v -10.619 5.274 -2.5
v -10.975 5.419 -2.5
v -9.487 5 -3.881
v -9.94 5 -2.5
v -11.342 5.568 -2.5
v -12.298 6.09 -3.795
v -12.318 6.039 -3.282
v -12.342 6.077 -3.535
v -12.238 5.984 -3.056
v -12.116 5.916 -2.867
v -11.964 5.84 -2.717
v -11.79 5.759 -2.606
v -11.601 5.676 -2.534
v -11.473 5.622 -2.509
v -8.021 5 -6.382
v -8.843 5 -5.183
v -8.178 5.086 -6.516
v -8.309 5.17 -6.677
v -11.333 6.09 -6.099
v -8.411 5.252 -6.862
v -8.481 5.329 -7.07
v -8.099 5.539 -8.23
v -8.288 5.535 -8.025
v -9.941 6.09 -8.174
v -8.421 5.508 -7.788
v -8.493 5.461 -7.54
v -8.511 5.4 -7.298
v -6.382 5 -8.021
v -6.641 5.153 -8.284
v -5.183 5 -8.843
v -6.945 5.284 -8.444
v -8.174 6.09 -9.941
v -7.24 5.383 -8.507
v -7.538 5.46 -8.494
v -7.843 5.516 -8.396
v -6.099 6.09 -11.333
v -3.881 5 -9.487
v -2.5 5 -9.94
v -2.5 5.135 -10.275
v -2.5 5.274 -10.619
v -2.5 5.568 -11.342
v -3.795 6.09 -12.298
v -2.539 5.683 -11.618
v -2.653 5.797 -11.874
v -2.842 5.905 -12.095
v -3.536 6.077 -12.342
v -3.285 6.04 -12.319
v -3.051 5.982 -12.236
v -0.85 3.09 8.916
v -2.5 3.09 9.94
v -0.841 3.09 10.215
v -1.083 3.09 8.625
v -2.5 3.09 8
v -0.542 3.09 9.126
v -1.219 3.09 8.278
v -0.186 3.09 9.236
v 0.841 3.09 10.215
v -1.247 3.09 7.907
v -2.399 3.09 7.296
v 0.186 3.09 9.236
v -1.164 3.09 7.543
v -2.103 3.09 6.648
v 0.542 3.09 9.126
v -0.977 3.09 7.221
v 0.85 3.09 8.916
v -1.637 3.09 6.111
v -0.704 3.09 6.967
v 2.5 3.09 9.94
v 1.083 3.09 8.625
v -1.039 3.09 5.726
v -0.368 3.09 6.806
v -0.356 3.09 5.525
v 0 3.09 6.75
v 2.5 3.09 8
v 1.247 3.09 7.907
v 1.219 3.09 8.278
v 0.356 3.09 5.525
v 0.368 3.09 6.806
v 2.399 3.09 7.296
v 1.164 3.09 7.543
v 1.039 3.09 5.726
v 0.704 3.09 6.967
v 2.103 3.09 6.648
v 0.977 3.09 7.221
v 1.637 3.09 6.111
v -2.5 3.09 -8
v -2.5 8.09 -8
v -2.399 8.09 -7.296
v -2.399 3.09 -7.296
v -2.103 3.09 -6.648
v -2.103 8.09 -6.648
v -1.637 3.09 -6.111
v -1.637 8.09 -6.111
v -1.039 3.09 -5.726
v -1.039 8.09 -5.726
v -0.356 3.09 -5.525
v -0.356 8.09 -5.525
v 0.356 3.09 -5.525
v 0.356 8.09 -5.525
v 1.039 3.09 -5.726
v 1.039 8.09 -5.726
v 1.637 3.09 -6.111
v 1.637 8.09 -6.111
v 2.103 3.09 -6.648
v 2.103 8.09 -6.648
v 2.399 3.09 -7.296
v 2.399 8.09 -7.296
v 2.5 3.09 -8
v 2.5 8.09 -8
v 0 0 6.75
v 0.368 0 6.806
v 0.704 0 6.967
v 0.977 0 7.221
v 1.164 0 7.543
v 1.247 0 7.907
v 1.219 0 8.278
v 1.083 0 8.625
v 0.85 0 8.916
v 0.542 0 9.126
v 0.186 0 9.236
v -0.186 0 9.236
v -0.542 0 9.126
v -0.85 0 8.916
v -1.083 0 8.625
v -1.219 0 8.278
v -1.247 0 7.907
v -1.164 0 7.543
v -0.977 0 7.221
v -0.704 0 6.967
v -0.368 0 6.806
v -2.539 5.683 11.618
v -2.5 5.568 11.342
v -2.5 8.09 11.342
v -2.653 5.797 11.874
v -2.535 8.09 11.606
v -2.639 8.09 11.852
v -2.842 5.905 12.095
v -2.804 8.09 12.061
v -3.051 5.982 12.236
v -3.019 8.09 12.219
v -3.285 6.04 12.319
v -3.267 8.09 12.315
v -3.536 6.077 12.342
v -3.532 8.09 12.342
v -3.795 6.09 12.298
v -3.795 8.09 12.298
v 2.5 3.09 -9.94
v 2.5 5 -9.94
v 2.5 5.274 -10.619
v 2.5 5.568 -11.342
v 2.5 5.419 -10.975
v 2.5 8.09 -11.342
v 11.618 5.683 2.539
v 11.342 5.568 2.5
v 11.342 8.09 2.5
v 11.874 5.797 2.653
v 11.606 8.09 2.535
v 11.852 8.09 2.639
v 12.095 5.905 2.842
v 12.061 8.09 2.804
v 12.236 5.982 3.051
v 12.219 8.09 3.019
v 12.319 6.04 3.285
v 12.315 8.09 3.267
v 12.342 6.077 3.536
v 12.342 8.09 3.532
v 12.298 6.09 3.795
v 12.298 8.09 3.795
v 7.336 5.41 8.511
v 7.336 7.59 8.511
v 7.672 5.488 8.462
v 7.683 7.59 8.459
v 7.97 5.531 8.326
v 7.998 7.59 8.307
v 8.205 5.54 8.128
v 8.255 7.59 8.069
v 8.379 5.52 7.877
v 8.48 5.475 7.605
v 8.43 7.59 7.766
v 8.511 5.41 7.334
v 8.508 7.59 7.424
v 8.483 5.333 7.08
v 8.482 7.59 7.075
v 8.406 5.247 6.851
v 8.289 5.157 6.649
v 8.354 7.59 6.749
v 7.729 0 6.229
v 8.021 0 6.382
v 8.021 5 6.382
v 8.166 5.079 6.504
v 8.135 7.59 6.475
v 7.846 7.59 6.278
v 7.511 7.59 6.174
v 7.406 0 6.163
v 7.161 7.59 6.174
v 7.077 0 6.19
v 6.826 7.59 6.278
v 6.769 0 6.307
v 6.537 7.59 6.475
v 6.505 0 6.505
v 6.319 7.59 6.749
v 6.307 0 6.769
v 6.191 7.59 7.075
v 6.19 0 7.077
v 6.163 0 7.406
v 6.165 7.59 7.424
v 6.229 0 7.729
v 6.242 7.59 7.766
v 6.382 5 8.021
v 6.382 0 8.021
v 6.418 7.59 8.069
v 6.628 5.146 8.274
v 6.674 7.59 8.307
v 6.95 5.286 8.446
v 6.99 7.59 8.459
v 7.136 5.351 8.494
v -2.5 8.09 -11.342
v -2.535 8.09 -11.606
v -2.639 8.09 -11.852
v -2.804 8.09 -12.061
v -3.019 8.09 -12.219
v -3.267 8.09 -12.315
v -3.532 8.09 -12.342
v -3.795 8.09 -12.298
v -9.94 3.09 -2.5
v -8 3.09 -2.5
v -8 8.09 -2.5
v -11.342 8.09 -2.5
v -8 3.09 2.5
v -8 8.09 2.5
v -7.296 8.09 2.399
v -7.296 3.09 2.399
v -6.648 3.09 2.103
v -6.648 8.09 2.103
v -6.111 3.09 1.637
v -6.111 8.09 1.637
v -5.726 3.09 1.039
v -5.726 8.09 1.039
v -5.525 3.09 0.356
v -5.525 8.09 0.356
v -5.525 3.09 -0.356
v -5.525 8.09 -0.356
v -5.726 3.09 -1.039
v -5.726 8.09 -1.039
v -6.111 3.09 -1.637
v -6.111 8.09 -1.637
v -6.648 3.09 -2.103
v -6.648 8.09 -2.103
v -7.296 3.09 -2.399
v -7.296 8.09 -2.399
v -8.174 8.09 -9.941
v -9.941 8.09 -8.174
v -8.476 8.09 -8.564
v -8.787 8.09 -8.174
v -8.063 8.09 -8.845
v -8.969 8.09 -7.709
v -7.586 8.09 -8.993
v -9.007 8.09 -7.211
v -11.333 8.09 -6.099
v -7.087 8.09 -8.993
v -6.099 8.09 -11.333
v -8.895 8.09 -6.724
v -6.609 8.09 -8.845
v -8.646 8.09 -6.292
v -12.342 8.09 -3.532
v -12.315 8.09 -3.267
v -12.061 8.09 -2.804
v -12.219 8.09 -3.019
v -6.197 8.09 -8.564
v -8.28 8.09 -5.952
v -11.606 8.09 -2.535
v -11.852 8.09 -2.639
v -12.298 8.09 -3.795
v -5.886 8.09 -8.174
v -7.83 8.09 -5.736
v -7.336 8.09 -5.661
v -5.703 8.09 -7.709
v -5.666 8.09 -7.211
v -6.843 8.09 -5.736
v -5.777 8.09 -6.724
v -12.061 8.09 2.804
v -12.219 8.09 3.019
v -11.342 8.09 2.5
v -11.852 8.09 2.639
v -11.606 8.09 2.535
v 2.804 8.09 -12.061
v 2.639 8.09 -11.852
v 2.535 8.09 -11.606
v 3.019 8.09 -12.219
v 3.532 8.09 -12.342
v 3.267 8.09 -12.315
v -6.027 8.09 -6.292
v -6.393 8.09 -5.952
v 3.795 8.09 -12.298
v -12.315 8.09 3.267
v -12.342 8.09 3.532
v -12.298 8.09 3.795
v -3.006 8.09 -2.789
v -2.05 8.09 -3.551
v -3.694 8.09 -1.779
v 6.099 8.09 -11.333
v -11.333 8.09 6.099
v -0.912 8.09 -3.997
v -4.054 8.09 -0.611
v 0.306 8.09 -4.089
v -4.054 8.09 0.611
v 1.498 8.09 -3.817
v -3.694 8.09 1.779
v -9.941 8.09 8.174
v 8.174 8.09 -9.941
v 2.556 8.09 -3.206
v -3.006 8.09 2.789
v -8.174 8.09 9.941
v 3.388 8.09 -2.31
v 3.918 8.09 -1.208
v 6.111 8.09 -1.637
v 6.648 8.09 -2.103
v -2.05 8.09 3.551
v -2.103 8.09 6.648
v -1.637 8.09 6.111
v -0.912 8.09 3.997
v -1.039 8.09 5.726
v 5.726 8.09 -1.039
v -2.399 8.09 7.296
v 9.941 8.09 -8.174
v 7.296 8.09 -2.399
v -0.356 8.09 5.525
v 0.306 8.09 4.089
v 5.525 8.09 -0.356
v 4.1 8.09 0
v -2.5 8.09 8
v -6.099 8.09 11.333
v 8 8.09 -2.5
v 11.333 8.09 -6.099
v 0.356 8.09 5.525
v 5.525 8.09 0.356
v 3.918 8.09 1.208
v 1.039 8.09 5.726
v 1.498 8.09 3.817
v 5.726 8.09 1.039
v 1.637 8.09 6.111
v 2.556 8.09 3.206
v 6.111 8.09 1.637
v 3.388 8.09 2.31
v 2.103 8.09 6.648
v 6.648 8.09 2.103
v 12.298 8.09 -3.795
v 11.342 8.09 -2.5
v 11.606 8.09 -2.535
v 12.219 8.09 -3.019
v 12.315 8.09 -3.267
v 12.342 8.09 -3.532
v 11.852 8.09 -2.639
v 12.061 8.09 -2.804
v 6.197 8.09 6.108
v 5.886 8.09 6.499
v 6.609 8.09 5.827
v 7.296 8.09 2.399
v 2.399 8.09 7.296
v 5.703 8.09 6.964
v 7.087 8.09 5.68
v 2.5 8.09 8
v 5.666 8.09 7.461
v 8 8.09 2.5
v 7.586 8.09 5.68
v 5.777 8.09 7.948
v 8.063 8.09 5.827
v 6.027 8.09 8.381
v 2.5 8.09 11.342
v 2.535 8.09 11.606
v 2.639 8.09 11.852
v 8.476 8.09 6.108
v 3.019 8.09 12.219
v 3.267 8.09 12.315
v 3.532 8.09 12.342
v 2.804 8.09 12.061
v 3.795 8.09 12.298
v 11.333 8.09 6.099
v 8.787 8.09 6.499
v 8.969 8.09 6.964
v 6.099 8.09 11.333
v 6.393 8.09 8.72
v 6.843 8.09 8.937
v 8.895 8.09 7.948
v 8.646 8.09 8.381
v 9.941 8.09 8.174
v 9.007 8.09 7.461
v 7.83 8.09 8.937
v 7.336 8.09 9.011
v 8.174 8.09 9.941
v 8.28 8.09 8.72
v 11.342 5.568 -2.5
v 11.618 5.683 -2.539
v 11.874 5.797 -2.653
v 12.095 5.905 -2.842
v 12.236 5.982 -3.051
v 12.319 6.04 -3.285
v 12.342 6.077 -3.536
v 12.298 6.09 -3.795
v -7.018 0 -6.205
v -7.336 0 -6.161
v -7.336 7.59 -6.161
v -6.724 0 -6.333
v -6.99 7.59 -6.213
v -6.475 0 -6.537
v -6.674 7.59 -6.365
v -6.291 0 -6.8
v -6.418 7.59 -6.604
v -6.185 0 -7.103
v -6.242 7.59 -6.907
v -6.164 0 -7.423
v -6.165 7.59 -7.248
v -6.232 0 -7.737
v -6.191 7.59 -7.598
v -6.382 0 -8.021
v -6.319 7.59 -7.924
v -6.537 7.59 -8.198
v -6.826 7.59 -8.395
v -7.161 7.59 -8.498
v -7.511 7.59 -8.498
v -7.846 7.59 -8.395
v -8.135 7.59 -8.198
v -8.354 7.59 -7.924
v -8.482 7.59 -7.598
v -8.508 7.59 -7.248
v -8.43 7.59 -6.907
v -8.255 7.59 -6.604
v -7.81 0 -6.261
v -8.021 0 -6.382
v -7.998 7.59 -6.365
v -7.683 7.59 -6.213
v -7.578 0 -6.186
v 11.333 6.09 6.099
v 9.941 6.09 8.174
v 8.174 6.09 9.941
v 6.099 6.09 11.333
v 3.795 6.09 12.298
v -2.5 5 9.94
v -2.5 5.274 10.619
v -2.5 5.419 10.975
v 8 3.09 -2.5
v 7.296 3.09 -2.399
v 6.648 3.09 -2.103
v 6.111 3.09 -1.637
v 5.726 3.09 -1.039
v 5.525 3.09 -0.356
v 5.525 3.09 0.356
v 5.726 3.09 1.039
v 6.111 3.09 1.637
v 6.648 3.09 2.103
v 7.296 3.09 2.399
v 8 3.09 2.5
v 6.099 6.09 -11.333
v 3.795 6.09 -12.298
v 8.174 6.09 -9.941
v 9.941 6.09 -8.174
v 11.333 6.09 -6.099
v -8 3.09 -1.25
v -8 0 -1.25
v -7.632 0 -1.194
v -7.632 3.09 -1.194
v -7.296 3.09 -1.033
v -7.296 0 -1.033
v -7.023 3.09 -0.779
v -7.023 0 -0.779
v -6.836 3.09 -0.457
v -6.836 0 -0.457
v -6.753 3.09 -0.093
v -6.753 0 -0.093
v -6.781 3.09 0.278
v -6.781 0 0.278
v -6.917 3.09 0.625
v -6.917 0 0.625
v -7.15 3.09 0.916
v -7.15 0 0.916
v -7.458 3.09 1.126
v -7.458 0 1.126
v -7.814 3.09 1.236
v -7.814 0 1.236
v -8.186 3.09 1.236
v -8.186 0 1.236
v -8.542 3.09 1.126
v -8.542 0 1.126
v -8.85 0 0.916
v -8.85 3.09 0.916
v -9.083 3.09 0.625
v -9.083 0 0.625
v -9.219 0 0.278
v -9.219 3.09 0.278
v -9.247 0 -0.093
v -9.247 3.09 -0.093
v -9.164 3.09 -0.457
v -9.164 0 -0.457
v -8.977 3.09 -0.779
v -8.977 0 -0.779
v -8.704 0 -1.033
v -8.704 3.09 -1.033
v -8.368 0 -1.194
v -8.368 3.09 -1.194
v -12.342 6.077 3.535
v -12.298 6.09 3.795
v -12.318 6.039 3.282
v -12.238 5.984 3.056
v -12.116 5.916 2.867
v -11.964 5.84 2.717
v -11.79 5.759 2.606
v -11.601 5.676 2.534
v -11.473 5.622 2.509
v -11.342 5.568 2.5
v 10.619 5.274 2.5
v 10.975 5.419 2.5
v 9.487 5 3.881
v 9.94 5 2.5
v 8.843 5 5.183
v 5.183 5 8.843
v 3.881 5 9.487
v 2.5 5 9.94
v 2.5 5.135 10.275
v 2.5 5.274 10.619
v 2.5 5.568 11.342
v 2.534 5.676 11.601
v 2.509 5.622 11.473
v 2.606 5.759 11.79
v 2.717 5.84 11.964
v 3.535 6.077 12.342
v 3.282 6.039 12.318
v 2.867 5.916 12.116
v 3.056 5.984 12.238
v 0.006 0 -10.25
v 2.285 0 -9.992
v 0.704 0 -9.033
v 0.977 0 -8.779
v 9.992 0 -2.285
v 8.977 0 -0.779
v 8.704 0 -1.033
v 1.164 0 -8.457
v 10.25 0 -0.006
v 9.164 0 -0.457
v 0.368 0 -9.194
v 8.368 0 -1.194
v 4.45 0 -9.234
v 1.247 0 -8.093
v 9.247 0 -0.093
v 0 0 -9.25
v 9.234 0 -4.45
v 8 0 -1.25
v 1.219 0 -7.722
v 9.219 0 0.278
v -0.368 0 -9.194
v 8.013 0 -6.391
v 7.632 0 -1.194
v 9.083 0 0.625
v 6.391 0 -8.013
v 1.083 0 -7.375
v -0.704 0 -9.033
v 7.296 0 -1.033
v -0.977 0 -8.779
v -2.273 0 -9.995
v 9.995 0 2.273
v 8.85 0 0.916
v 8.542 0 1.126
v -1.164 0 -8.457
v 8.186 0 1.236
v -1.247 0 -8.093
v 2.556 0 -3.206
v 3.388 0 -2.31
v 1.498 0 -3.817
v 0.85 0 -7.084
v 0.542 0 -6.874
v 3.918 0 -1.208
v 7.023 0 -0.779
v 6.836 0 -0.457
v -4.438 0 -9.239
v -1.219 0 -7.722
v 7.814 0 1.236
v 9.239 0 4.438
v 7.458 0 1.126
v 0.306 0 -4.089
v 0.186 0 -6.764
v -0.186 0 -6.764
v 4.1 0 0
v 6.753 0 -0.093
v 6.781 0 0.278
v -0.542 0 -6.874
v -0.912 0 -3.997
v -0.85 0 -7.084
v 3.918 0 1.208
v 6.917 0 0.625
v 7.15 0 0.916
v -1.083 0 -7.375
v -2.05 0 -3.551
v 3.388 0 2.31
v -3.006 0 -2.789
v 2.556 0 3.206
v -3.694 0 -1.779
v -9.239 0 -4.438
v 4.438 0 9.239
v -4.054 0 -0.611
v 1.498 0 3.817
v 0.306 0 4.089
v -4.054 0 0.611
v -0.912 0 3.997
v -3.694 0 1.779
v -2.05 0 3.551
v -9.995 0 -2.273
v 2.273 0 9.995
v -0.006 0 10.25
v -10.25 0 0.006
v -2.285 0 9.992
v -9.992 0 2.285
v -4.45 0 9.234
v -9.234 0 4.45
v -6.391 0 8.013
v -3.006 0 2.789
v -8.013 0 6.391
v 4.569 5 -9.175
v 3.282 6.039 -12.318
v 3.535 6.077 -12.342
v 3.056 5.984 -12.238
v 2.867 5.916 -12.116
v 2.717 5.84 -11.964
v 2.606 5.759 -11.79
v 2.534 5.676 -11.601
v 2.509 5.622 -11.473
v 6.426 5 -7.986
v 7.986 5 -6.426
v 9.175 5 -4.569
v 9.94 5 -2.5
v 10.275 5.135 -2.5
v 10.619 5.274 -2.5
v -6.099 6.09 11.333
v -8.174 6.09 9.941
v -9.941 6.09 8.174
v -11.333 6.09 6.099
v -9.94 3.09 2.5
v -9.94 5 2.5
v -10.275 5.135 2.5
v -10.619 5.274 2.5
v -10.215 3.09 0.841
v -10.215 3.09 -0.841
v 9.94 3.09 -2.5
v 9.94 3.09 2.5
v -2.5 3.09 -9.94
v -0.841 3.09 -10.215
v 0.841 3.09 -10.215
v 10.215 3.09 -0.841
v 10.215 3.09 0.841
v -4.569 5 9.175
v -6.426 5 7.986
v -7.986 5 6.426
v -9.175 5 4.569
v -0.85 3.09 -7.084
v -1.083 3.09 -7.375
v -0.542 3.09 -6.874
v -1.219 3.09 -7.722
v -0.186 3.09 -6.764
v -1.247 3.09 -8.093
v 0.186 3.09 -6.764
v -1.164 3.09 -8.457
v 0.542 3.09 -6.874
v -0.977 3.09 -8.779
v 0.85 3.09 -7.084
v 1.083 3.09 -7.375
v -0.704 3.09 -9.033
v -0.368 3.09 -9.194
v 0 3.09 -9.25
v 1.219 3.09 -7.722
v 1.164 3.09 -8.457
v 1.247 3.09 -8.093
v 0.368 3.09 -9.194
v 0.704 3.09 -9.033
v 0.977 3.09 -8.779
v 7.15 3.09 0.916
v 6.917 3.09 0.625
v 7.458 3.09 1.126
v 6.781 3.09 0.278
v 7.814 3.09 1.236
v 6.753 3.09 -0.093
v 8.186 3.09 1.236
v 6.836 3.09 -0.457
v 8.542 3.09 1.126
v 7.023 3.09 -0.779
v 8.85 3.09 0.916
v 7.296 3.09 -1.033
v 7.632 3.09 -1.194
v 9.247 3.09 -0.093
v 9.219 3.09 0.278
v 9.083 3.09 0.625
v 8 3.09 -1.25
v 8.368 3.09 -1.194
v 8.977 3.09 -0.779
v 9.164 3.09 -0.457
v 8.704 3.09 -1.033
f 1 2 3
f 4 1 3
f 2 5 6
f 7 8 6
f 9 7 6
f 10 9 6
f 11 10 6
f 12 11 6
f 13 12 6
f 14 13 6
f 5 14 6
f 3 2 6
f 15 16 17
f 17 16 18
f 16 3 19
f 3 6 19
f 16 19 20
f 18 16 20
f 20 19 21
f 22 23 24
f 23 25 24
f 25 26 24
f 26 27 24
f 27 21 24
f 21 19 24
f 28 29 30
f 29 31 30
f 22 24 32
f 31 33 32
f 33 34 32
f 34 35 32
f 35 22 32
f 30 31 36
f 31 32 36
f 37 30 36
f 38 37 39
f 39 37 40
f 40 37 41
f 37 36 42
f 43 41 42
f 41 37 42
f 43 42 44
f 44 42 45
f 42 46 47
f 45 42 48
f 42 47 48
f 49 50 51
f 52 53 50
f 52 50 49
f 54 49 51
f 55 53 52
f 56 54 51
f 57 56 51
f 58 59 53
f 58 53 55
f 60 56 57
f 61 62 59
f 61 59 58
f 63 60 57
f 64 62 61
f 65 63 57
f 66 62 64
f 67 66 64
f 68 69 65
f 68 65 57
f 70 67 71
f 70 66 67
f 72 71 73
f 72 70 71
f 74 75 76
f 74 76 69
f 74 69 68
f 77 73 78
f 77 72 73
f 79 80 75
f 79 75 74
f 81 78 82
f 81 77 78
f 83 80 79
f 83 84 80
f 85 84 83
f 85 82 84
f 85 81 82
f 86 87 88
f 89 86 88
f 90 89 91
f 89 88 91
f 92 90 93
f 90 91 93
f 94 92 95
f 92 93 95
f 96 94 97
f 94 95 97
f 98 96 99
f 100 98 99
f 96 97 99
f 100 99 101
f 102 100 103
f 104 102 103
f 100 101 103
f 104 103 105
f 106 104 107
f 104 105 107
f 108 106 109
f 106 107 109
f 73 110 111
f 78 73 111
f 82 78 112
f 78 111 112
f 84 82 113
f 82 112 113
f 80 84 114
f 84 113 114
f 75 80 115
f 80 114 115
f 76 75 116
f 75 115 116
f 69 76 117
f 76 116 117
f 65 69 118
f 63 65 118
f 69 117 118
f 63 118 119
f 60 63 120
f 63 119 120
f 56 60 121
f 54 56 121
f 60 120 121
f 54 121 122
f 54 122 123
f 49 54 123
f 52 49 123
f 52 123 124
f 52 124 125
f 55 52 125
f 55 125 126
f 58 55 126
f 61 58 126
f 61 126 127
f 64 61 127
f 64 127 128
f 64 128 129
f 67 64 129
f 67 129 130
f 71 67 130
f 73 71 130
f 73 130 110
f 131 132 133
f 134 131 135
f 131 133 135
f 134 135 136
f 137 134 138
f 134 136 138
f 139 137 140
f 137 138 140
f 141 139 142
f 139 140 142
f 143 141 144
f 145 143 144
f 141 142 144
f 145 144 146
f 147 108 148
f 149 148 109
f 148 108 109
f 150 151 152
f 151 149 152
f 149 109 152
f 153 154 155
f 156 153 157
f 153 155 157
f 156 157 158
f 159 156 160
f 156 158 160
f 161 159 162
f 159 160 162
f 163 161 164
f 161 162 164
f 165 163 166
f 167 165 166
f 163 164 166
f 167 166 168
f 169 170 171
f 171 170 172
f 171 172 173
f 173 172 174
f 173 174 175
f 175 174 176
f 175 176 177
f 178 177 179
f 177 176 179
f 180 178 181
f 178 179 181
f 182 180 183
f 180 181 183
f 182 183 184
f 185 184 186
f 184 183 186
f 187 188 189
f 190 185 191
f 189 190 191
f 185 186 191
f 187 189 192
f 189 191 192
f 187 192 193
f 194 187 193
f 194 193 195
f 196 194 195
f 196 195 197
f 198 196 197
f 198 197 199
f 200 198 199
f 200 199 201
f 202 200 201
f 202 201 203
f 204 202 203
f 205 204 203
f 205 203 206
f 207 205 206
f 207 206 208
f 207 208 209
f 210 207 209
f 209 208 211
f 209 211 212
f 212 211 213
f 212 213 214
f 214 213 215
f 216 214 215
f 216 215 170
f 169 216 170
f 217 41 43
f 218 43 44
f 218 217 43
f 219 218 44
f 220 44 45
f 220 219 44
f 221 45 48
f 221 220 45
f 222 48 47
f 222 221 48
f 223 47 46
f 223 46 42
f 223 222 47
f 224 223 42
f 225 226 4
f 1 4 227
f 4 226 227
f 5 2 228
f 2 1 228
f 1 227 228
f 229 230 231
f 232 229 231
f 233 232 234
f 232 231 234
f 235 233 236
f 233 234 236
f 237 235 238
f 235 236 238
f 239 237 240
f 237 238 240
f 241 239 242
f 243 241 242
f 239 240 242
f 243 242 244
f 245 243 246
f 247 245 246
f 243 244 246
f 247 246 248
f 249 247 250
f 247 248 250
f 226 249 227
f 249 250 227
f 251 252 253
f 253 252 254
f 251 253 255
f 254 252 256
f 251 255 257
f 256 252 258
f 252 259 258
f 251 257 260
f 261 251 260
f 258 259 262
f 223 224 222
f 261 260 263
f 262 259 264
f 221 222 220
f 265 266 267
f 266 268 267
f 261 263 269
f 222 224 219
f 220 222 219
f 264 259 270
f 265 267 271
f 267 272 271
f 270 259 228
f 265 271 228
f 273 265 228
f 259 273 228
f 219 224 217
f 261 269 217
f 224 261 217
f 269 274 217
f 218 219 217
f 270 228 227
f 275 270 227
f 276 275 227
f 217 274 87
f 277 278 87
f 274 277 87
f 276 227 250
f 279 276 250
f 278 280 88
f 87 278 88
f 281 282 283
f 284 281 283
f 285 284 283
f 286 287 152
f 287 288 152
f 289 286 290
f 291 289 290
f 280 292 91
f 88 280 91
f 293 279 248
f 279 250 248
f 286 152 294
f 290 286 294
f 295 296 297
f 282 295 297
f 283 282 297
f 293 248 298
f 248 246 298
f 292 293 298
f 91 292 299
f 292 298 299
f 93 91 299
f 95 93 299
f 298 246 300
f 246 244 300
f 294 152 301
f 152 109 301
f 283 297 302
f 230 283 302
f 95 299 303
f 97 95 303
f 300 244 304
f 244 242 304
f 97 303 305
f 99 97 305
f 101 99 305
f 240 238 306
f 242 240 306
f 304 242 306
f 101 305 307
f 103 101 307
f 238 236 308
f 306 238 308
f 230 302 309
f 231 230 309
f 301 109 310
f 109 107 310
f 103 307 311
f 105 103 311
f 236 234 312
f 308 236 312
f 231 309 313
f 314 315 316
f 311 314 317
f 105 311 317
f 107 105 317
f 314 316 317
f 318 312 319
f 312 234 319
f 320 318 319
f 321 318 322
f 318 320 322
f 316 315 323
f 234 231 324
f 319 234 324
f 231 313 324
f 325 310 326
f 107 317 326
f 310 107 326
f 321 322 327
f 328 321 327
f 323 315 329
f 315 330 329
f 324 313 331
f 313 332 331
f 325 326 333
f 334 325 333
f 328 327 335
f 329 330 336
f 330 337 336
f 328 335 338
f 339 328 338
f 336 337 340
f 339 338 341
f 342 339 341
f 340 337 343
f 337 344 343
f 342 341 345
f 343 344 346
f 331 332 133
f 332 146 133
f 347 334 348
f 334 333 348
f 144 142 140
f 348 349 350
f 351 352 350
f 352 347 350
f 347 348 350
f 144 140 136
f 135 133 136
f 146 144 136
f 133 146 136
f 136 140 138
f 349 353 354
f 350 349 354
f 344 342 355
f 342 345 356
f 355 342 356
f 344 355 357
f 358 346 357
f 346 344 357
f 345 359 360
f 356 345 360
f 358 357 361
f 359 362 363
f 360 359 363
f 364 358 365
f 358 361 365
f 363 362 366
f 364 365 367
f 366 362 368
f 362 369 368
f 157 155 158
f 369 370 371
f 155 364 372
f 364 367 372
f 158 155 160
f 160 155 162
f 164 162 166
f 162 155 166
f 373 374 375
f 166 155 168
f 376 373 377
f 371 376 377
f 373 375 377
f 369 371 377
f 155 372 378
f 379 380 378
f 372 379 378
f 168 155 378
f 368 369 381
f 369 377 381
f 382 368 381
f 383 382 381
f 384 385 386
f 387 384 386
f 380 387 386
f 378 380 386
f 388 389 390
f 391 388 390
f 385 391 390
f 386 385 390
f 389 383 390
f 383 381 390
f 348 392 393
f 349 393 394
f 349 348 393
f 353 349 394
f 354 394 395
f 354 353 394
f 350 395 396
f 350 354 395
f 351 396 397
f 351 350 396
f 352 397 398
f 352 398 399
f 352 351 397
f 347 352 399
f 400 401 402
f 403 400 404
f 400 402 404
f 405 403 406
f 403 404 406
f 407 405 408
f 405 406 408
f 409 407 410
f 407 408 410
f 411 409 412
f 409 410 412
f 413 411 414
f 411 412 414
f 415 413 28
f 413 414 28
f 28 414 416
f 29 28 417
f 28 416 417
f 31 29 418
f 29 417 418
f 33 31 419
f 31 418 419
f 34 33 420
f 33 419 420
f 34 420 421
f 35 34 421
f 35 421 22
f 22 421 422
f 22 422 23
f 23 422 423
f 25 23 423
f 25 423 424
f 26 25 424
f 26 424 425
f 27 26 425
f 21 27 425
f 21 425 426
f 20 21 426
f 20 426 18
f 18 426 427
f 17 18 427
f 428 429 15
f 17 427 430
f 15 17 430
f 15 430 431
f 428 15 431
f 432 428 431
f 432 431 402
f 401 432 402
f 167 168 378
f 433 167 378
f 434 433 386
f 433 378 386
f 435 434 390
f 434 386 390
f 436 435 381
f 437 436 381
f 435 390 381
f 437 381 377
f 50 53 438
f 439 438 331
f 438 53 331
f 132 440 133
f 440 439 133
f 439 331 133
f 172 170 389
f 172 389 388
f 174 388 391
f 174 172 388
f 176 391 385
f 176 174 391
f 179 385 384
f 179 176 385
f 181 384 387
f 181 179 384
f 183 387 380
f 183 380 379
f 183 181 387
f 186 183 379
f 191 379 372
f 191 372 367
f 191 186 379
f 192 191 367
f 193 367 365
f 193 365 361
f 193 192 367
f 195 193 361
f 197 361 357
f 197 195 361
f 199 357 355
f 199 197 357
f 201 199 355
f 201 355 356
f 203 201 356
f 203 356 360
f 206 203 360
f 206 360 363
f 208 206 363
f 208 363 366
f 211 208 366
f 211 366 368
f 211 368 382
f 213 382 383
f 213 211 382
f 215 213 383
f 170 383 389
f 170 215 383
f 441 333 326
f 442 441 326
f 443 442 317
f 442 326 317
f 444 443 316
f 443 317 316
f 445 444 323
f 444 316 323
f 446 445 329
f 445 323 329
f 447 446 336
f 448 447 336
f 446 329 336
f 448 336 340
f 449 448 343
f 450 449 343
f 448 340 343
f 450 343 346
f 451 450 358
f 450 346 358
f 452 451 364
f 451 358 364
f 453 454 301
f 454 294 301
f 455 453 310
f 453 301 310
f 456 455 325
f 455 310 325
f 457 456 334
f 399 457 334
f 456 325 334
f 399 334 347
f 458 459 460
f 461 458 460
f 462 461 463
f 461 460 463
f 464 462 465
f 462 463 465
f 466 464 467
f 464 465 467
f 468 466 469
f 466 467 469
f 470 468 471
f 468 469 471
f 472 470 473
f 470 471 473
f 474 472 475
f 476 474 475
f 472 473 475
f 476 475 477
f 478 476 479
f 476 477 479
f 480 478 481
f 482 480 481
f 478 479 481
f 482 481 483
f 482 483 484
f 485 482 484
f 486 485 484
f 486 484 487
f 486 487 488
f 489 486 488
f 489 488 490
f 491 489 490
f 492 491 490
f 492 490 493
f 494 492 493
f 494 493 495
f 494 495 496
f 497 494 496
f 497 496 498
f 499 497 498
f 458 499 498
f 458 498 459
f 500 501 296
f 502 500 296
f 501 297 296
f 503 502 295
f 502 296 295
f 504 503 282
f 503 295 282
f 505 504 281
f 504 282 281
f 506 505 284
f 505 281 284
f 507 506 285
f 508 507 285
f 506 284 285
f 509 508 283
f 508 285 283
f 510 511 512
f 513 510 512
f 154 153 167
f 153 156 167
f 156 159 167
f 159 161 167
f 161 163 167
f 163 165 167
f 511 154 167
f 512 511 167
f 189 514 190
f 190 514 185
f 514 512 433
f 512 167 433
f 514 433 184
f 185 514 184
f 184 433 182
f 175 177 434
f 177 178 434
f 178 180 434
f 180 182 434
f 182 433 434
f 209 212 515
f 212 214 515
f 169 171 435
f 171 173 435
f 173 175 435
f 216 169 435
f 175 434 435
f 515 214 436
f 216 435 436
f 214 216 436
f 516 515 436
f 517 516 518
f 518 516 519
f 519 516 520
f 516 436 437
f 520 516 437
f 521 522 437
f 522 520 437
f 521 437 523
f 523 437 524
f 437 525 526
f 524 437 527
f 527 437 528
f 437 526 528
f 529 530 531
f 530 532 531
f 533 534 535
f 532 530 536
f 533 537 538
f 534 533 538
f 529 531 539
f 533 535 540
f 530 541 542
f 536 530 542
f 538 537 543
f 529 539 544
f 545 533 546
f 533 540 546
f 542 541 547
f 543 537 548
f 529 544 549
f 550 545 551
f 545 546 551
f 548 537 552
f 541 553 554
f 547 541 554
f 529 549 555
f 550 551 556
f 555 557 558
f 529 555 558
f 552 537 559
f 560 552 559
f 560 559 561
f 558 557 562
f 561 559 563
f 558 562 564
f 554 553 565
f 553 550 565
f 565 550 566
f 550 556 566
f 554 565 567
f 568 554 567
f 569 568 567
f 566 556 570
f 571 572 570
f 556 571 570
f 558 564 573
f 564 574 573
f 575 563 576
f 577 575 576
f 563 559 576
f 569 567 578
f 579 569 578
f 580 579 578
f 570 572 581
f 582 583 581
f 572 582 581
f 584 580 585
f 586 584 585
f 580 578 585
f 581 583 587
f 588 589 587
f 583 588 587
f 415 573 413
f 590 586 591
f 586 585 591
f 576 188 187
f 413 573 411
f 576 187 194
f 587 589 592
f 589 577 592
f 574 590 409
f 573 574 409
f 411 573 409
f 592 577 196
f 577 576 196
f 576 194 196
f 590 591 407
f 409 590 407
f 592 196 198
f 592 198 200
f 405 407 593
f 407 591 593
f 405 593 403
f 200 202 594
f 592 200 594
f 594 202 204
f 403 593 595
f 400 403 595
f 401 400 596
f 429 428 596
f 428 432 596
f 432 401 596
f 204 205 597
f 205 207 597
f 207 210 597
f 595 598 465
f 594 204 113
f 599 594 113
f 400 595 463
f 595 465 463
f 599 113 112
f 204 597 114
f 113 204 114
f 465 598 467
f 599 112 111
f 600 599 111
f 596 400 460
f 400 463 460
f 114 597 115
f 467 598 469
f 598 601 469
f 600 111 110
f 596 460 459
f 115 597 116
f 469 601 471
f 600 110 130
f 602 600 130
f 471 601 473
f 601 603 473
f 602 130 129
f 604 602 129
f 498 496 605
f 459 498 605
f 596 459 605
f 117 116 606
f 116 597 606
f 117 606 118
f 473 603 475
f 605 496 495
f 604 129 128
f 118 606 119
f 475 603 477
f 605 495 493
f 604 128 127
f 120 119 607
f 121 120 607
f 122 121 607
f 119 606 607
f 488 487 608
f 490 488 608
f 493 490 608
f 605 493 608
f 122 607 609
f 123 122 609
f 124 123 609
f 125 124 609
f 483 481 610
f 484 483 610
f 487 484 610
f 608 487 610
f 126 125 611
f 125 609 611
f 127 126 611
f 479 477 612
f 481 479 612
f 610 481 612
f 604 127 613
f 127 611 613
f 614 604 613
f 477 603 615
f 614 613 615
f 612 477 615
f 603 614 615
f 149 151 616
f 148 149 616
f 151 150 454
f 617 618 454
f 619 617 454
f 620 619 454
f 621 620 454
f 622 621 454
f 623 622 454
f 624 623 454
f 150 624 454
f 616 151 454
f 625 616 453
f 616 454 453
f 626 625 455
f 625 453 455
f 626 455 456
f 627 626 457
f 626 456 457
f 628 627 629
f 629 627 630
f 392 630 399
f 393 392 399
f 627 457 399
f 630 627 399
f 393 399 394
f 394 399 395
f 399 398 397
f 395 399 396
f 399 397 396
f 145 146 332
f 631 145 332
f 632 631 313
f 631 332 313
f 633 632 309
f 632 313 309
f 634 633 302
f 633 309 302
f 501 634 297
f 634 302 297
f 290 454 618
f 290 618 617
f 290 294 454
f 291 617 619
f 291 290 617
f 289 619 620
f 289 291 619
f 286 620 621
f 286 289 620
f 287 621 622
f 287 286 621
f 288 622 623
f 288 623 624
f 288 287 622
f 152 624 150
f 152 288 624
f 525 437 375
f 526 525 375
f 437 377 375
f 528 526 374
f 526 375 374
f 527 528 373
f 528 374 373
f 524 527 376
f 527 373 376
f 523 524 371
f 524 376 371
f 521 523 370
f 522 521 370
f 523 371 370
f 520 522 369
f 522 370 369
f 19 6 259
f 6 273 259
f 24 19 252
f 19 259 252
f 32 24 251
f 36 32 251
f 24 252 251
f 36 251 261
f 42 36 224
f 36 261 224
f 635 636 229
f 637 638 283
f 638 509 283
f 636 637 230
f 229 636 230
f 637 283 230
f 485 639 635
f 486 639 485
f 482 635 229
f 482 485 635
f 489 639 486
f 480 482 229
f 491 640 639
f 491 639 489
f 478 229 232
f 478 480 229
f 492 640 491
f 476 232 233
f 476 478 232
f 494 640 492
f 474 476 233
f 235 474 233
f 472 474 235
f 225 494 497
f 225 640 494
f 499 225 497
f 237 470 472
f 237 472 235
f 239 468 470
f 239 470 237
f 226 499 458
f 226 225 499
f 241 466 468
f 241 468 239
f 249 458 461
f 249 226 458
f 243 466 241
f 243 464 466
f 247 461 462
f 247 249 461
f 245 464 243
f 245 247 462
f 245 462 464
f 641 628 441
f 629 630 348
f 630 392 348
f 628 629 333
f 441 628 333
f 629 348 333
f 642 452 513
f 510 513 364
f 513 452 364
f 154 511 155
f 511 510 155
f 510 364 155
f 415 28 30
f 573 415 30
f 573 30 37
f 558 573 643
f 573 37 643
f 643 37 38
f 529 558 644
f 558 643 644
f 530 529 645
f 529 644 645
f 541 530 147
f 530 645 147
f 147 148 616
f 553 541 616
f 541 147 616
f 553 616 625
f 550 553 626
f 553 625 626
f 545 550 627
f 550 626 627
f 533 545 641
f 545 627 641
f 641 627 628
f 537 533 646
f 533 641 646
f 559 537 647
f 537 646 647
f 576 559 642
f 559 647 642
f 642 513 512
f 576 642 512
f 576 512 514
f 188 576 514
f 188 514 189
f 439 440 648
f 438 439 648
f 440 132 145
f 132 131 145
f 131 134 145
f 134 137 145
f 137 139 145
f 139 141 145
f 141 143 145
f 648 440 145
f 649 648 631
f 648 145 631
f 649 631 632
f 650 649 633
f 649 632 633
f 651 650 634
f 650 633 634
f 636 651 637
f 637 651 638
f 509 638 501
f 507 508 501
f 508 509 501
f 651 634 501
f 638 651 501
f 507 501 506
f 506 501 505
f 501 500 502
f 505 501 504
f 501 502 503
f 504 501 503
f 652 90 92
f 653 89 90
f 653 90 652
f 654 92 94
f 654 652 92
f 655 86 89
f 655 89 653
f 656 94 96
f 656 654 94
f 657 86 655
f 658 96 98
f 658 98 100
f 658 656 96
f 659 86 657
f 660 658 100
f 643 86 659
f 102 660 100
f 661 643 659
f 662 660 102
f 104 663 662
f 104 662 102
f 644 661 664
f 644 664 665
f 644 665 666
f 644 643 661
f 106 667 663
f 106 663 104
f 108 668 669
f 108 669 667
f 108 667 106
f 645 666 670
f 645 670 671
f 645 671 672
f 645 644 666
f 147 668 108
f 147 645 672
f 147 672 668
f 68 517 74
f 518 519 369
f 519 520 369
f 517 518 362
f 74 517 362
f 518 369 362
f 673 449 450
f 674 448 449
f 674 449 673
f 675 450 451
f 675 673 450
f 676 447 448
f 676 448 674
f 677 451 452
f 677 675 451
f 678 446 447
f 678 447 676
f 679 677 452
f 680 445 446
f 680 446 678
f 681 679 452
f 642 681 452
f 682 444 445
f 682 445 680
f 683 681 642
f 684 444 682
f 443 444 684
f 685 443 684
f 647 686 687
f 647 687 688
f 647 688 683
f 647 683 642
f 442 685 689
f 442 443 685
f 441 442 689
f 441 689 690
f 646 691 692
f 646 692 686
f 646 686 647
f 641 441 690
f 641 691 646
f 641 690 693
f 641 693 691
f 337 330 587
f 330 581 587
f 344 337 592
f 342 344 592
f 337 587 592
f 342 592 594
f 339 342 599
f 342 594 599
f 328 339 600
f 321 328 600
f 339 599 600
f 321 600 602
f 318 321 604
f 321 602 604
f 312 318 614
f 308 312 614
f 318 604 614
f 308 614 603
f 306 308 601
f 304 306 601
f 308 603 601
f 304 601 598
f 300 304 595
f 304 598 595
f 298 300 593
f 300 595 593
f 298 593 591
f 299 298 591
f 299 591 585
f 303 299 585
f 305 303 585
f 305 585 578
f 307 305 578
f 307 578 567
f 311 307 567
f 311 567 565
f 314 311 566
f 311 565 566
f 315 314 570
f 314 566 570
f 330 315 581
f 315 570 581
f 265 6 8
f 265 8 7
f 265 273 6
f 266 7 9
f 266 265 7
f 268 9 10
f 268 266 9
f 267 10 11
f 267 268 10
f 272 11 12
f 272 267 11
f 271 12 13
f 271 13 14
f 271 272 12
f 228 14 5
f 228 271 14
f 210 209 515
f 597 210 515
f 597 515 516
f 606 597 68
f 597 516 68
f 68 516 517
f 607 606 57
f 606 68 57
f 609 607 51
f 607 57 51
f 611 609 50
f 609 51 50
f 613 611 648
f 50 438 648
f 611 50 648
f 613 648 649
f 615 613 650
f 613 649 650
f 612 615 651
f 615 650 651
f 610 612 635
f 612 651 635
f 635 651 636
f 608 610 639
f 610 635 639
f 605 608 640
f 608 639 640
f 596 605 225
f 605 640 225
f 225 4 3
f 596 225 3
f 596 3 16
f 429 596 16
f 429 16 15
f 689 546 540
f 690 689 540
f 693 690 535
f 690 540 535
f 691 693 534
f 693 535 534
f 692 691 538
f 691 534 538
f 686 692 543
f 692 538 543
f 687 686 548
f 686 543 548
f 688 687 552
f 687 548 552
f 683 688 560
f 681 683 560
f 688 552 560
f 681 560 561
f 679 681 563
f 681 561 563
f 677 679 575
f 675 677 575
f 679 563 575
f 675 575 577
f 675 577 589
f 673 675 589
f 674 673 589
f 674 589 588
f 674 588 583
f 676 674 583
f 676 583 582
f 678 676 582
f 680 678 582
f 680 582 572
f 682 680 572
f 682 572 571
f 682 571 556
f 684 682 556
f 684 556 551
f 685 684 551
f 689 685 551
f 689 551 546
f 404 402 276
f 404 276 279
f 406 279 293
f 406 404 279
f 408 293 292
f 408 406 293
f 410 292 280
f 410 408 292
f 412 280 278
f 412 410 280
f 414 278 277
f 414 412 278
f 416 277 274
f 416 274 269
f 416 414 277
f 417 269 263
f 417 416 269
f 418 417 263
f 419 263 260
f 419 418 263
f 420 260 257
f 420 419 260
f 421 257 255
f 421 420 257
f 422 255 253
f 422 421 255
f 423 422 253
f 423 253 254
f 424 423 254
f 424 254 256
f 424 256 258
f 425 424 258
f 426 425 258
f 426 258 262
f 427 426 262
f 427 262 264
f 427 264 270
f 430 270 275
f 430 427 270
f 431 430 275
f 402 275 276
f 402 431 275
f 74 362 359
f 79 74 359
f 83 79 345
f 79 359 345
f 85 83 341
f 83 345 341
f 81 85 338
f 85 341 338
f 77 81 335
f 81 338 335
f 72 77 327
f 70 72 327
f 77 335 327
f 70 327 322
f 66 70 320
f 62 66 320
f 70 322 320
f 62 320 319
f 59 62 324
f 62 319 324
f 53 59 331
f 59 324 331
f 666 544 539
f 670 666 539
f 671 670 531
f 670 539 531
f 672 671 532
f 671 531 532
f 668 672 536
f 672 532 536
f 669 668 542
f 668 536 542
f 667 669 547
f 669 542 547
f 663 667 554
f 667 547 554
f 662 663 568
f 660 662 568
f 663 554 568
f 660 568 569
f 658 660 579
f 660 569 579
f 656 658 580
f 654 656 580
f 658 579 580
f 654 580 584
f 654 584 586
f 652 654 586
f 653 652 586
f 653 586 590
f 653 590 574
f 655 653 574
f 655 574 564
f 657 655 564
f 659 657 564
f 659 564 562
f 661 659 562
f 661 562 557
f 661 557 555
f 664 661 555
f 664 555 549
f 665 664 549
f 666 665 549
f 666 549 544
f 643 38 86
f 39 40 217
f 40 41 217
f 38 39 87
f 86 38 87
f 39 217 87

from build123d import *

# Parameters (mm, degrees)
SKETCH3_R          = 1.25
CUT_EXTRUDE1_DEPTH = 20.917878903
CUT_EXTRUDE2_DEPTH = 5
SKETCH4_R          = 1.175
CUT_EXTRUDE3_DEPTH = 20.601579018
CHAMFER1_SIZE      = 0.5
FILLET1_R          = 1


with BuildPart() as part:
    # Sketch2 → Revolve2 (revolve)
    with BuildSketch(Plane.XY):
        Polygon((4.1, 0), (10.25, 0), (10.25, 5), (12.87, 6.09), (12.87, 8.09), (4.1, 8.09), align=None)
    revolve(axis=Axis((0, 8.09, 0), (0, -1, 0)))

    # Sketch3 → Cut-Extrude1 (cut, through all)
    with BuildSketch(Plane.XZ):
        with Locations(Location((0, 8, 0), (0, 0, 270))):
            Circle(SKETCH3_R)
        with Locations(Location((8, 0, 0), (0, 0, 270))):
            Circle(SKETCH3_R)
        with Locations(Location((0, -8, 0), (0, 0, 270))):
            Circle(SKETCH3_R)
        with Locations(Location((-8, 0, 0), (0, 0, 270))):
            Circle(SKETCH3_R)
    extrude(amount=-CUT_EXTRUDE1_DEPTH, mode=Mode.SUBTRACT)

    # Sketch5 → Cut-Extrude2 (cut)
    with BuildSketch(Plane(origin=(0, 8.09, 0), x_dir=(1, 0, 0), z_dir=(0, 1, 0))):
        with BuildLine():
            Line((-2.5, -8), (-2.5, -14))
            Line((-2.5, -14), (2.5, -14))
            Line((2.5, -14), (2.5, -8))
            ThreePointArc((2.5, -8), (0, -5.5), (-2.5, -8))
        make_face()
        with BuildLine():
            Line((-8, 2.5), (-14, 2.5))
            Line((-14, 2.5), (-14, -2.5))
            Line((-14, -2.5), (-8, -2.5))
            ThreePointArc((-8, -2.5), (-5.5, 0), (-8, 2.5))
        make_face()
        with BuildLine():
            Line((2.5, 8), (2.5, 14))
            Line((2.5, 14), (-2.5, 14))
            Line((-2.5, 14), (-2.5, 8))
            ThreePointArc((-2.5, 8), (0, 5.5), (2.5, 8))
        make_face()
        with BuildLine():
            Line((8, -2.5), (14, -2.5))
            Line((14, -2.5), (14, 2.5))
            Line((14, 2.5), (8, 2.5))
            ThreePointArc((8, 2.5), (5.5, 0), (8, -2.5))
        make_face()
    extrude(amount=-CUT_EXTRUDE2_DEPTH, mode=Mode.SUBTRACT)

    # Sketch4 → Cut-Extrude3 (cut, through all)
    with BuildSketch(Plane(origin=(0, 8.09, 0), x_dir=(1, 0, 0), z_dir=(0, 1, 0))):
        with Locations(Location((-7.336232855, 7.336232855, 0), (0, 0, 270))):
            Circle(SKETCH4_R)
        with Locations(Location((7.336232855, -7.336232855, 0), (0, 0, 270))):
            Circle(SKETCH4_R)
    extrude(amount=-CUT_EXTRUDE3_DEPTH, mode=Mode.SUBTRACT)

    # Chamfer1
    chamfer1_edges = [part.edges().sort_by_distance(p)[0] for p in [
        (7.336232855, 8.09, 6.161232855),
        (-7.336232855, 8.09, -8.511232855),
    ]]
    chamfer(chamfer1_edges, length=CHAMFER1_SIZE)

    # Fillet1
    fillet1_edges = [part.edges().sort_by_distance(p)[0] for p in [
        (-2.5, 7.09, -12.624852474),
        (2.5, 7.09, -12.624852474),
        (-12.624852474, 7.09, 2.5),
        (-12.624852474, 7.09, -2.5),
        (12.624852474, 7.09, -2.5),
        (12.624852474, 7.09, 2.5),
        (2.5, 7.09, 12.624852474),
        (-2.5, 7.09, 12.624852474),
    ]]
    fillet(fillet1_edges, radius=FILLET1_R)


solid = part.part
